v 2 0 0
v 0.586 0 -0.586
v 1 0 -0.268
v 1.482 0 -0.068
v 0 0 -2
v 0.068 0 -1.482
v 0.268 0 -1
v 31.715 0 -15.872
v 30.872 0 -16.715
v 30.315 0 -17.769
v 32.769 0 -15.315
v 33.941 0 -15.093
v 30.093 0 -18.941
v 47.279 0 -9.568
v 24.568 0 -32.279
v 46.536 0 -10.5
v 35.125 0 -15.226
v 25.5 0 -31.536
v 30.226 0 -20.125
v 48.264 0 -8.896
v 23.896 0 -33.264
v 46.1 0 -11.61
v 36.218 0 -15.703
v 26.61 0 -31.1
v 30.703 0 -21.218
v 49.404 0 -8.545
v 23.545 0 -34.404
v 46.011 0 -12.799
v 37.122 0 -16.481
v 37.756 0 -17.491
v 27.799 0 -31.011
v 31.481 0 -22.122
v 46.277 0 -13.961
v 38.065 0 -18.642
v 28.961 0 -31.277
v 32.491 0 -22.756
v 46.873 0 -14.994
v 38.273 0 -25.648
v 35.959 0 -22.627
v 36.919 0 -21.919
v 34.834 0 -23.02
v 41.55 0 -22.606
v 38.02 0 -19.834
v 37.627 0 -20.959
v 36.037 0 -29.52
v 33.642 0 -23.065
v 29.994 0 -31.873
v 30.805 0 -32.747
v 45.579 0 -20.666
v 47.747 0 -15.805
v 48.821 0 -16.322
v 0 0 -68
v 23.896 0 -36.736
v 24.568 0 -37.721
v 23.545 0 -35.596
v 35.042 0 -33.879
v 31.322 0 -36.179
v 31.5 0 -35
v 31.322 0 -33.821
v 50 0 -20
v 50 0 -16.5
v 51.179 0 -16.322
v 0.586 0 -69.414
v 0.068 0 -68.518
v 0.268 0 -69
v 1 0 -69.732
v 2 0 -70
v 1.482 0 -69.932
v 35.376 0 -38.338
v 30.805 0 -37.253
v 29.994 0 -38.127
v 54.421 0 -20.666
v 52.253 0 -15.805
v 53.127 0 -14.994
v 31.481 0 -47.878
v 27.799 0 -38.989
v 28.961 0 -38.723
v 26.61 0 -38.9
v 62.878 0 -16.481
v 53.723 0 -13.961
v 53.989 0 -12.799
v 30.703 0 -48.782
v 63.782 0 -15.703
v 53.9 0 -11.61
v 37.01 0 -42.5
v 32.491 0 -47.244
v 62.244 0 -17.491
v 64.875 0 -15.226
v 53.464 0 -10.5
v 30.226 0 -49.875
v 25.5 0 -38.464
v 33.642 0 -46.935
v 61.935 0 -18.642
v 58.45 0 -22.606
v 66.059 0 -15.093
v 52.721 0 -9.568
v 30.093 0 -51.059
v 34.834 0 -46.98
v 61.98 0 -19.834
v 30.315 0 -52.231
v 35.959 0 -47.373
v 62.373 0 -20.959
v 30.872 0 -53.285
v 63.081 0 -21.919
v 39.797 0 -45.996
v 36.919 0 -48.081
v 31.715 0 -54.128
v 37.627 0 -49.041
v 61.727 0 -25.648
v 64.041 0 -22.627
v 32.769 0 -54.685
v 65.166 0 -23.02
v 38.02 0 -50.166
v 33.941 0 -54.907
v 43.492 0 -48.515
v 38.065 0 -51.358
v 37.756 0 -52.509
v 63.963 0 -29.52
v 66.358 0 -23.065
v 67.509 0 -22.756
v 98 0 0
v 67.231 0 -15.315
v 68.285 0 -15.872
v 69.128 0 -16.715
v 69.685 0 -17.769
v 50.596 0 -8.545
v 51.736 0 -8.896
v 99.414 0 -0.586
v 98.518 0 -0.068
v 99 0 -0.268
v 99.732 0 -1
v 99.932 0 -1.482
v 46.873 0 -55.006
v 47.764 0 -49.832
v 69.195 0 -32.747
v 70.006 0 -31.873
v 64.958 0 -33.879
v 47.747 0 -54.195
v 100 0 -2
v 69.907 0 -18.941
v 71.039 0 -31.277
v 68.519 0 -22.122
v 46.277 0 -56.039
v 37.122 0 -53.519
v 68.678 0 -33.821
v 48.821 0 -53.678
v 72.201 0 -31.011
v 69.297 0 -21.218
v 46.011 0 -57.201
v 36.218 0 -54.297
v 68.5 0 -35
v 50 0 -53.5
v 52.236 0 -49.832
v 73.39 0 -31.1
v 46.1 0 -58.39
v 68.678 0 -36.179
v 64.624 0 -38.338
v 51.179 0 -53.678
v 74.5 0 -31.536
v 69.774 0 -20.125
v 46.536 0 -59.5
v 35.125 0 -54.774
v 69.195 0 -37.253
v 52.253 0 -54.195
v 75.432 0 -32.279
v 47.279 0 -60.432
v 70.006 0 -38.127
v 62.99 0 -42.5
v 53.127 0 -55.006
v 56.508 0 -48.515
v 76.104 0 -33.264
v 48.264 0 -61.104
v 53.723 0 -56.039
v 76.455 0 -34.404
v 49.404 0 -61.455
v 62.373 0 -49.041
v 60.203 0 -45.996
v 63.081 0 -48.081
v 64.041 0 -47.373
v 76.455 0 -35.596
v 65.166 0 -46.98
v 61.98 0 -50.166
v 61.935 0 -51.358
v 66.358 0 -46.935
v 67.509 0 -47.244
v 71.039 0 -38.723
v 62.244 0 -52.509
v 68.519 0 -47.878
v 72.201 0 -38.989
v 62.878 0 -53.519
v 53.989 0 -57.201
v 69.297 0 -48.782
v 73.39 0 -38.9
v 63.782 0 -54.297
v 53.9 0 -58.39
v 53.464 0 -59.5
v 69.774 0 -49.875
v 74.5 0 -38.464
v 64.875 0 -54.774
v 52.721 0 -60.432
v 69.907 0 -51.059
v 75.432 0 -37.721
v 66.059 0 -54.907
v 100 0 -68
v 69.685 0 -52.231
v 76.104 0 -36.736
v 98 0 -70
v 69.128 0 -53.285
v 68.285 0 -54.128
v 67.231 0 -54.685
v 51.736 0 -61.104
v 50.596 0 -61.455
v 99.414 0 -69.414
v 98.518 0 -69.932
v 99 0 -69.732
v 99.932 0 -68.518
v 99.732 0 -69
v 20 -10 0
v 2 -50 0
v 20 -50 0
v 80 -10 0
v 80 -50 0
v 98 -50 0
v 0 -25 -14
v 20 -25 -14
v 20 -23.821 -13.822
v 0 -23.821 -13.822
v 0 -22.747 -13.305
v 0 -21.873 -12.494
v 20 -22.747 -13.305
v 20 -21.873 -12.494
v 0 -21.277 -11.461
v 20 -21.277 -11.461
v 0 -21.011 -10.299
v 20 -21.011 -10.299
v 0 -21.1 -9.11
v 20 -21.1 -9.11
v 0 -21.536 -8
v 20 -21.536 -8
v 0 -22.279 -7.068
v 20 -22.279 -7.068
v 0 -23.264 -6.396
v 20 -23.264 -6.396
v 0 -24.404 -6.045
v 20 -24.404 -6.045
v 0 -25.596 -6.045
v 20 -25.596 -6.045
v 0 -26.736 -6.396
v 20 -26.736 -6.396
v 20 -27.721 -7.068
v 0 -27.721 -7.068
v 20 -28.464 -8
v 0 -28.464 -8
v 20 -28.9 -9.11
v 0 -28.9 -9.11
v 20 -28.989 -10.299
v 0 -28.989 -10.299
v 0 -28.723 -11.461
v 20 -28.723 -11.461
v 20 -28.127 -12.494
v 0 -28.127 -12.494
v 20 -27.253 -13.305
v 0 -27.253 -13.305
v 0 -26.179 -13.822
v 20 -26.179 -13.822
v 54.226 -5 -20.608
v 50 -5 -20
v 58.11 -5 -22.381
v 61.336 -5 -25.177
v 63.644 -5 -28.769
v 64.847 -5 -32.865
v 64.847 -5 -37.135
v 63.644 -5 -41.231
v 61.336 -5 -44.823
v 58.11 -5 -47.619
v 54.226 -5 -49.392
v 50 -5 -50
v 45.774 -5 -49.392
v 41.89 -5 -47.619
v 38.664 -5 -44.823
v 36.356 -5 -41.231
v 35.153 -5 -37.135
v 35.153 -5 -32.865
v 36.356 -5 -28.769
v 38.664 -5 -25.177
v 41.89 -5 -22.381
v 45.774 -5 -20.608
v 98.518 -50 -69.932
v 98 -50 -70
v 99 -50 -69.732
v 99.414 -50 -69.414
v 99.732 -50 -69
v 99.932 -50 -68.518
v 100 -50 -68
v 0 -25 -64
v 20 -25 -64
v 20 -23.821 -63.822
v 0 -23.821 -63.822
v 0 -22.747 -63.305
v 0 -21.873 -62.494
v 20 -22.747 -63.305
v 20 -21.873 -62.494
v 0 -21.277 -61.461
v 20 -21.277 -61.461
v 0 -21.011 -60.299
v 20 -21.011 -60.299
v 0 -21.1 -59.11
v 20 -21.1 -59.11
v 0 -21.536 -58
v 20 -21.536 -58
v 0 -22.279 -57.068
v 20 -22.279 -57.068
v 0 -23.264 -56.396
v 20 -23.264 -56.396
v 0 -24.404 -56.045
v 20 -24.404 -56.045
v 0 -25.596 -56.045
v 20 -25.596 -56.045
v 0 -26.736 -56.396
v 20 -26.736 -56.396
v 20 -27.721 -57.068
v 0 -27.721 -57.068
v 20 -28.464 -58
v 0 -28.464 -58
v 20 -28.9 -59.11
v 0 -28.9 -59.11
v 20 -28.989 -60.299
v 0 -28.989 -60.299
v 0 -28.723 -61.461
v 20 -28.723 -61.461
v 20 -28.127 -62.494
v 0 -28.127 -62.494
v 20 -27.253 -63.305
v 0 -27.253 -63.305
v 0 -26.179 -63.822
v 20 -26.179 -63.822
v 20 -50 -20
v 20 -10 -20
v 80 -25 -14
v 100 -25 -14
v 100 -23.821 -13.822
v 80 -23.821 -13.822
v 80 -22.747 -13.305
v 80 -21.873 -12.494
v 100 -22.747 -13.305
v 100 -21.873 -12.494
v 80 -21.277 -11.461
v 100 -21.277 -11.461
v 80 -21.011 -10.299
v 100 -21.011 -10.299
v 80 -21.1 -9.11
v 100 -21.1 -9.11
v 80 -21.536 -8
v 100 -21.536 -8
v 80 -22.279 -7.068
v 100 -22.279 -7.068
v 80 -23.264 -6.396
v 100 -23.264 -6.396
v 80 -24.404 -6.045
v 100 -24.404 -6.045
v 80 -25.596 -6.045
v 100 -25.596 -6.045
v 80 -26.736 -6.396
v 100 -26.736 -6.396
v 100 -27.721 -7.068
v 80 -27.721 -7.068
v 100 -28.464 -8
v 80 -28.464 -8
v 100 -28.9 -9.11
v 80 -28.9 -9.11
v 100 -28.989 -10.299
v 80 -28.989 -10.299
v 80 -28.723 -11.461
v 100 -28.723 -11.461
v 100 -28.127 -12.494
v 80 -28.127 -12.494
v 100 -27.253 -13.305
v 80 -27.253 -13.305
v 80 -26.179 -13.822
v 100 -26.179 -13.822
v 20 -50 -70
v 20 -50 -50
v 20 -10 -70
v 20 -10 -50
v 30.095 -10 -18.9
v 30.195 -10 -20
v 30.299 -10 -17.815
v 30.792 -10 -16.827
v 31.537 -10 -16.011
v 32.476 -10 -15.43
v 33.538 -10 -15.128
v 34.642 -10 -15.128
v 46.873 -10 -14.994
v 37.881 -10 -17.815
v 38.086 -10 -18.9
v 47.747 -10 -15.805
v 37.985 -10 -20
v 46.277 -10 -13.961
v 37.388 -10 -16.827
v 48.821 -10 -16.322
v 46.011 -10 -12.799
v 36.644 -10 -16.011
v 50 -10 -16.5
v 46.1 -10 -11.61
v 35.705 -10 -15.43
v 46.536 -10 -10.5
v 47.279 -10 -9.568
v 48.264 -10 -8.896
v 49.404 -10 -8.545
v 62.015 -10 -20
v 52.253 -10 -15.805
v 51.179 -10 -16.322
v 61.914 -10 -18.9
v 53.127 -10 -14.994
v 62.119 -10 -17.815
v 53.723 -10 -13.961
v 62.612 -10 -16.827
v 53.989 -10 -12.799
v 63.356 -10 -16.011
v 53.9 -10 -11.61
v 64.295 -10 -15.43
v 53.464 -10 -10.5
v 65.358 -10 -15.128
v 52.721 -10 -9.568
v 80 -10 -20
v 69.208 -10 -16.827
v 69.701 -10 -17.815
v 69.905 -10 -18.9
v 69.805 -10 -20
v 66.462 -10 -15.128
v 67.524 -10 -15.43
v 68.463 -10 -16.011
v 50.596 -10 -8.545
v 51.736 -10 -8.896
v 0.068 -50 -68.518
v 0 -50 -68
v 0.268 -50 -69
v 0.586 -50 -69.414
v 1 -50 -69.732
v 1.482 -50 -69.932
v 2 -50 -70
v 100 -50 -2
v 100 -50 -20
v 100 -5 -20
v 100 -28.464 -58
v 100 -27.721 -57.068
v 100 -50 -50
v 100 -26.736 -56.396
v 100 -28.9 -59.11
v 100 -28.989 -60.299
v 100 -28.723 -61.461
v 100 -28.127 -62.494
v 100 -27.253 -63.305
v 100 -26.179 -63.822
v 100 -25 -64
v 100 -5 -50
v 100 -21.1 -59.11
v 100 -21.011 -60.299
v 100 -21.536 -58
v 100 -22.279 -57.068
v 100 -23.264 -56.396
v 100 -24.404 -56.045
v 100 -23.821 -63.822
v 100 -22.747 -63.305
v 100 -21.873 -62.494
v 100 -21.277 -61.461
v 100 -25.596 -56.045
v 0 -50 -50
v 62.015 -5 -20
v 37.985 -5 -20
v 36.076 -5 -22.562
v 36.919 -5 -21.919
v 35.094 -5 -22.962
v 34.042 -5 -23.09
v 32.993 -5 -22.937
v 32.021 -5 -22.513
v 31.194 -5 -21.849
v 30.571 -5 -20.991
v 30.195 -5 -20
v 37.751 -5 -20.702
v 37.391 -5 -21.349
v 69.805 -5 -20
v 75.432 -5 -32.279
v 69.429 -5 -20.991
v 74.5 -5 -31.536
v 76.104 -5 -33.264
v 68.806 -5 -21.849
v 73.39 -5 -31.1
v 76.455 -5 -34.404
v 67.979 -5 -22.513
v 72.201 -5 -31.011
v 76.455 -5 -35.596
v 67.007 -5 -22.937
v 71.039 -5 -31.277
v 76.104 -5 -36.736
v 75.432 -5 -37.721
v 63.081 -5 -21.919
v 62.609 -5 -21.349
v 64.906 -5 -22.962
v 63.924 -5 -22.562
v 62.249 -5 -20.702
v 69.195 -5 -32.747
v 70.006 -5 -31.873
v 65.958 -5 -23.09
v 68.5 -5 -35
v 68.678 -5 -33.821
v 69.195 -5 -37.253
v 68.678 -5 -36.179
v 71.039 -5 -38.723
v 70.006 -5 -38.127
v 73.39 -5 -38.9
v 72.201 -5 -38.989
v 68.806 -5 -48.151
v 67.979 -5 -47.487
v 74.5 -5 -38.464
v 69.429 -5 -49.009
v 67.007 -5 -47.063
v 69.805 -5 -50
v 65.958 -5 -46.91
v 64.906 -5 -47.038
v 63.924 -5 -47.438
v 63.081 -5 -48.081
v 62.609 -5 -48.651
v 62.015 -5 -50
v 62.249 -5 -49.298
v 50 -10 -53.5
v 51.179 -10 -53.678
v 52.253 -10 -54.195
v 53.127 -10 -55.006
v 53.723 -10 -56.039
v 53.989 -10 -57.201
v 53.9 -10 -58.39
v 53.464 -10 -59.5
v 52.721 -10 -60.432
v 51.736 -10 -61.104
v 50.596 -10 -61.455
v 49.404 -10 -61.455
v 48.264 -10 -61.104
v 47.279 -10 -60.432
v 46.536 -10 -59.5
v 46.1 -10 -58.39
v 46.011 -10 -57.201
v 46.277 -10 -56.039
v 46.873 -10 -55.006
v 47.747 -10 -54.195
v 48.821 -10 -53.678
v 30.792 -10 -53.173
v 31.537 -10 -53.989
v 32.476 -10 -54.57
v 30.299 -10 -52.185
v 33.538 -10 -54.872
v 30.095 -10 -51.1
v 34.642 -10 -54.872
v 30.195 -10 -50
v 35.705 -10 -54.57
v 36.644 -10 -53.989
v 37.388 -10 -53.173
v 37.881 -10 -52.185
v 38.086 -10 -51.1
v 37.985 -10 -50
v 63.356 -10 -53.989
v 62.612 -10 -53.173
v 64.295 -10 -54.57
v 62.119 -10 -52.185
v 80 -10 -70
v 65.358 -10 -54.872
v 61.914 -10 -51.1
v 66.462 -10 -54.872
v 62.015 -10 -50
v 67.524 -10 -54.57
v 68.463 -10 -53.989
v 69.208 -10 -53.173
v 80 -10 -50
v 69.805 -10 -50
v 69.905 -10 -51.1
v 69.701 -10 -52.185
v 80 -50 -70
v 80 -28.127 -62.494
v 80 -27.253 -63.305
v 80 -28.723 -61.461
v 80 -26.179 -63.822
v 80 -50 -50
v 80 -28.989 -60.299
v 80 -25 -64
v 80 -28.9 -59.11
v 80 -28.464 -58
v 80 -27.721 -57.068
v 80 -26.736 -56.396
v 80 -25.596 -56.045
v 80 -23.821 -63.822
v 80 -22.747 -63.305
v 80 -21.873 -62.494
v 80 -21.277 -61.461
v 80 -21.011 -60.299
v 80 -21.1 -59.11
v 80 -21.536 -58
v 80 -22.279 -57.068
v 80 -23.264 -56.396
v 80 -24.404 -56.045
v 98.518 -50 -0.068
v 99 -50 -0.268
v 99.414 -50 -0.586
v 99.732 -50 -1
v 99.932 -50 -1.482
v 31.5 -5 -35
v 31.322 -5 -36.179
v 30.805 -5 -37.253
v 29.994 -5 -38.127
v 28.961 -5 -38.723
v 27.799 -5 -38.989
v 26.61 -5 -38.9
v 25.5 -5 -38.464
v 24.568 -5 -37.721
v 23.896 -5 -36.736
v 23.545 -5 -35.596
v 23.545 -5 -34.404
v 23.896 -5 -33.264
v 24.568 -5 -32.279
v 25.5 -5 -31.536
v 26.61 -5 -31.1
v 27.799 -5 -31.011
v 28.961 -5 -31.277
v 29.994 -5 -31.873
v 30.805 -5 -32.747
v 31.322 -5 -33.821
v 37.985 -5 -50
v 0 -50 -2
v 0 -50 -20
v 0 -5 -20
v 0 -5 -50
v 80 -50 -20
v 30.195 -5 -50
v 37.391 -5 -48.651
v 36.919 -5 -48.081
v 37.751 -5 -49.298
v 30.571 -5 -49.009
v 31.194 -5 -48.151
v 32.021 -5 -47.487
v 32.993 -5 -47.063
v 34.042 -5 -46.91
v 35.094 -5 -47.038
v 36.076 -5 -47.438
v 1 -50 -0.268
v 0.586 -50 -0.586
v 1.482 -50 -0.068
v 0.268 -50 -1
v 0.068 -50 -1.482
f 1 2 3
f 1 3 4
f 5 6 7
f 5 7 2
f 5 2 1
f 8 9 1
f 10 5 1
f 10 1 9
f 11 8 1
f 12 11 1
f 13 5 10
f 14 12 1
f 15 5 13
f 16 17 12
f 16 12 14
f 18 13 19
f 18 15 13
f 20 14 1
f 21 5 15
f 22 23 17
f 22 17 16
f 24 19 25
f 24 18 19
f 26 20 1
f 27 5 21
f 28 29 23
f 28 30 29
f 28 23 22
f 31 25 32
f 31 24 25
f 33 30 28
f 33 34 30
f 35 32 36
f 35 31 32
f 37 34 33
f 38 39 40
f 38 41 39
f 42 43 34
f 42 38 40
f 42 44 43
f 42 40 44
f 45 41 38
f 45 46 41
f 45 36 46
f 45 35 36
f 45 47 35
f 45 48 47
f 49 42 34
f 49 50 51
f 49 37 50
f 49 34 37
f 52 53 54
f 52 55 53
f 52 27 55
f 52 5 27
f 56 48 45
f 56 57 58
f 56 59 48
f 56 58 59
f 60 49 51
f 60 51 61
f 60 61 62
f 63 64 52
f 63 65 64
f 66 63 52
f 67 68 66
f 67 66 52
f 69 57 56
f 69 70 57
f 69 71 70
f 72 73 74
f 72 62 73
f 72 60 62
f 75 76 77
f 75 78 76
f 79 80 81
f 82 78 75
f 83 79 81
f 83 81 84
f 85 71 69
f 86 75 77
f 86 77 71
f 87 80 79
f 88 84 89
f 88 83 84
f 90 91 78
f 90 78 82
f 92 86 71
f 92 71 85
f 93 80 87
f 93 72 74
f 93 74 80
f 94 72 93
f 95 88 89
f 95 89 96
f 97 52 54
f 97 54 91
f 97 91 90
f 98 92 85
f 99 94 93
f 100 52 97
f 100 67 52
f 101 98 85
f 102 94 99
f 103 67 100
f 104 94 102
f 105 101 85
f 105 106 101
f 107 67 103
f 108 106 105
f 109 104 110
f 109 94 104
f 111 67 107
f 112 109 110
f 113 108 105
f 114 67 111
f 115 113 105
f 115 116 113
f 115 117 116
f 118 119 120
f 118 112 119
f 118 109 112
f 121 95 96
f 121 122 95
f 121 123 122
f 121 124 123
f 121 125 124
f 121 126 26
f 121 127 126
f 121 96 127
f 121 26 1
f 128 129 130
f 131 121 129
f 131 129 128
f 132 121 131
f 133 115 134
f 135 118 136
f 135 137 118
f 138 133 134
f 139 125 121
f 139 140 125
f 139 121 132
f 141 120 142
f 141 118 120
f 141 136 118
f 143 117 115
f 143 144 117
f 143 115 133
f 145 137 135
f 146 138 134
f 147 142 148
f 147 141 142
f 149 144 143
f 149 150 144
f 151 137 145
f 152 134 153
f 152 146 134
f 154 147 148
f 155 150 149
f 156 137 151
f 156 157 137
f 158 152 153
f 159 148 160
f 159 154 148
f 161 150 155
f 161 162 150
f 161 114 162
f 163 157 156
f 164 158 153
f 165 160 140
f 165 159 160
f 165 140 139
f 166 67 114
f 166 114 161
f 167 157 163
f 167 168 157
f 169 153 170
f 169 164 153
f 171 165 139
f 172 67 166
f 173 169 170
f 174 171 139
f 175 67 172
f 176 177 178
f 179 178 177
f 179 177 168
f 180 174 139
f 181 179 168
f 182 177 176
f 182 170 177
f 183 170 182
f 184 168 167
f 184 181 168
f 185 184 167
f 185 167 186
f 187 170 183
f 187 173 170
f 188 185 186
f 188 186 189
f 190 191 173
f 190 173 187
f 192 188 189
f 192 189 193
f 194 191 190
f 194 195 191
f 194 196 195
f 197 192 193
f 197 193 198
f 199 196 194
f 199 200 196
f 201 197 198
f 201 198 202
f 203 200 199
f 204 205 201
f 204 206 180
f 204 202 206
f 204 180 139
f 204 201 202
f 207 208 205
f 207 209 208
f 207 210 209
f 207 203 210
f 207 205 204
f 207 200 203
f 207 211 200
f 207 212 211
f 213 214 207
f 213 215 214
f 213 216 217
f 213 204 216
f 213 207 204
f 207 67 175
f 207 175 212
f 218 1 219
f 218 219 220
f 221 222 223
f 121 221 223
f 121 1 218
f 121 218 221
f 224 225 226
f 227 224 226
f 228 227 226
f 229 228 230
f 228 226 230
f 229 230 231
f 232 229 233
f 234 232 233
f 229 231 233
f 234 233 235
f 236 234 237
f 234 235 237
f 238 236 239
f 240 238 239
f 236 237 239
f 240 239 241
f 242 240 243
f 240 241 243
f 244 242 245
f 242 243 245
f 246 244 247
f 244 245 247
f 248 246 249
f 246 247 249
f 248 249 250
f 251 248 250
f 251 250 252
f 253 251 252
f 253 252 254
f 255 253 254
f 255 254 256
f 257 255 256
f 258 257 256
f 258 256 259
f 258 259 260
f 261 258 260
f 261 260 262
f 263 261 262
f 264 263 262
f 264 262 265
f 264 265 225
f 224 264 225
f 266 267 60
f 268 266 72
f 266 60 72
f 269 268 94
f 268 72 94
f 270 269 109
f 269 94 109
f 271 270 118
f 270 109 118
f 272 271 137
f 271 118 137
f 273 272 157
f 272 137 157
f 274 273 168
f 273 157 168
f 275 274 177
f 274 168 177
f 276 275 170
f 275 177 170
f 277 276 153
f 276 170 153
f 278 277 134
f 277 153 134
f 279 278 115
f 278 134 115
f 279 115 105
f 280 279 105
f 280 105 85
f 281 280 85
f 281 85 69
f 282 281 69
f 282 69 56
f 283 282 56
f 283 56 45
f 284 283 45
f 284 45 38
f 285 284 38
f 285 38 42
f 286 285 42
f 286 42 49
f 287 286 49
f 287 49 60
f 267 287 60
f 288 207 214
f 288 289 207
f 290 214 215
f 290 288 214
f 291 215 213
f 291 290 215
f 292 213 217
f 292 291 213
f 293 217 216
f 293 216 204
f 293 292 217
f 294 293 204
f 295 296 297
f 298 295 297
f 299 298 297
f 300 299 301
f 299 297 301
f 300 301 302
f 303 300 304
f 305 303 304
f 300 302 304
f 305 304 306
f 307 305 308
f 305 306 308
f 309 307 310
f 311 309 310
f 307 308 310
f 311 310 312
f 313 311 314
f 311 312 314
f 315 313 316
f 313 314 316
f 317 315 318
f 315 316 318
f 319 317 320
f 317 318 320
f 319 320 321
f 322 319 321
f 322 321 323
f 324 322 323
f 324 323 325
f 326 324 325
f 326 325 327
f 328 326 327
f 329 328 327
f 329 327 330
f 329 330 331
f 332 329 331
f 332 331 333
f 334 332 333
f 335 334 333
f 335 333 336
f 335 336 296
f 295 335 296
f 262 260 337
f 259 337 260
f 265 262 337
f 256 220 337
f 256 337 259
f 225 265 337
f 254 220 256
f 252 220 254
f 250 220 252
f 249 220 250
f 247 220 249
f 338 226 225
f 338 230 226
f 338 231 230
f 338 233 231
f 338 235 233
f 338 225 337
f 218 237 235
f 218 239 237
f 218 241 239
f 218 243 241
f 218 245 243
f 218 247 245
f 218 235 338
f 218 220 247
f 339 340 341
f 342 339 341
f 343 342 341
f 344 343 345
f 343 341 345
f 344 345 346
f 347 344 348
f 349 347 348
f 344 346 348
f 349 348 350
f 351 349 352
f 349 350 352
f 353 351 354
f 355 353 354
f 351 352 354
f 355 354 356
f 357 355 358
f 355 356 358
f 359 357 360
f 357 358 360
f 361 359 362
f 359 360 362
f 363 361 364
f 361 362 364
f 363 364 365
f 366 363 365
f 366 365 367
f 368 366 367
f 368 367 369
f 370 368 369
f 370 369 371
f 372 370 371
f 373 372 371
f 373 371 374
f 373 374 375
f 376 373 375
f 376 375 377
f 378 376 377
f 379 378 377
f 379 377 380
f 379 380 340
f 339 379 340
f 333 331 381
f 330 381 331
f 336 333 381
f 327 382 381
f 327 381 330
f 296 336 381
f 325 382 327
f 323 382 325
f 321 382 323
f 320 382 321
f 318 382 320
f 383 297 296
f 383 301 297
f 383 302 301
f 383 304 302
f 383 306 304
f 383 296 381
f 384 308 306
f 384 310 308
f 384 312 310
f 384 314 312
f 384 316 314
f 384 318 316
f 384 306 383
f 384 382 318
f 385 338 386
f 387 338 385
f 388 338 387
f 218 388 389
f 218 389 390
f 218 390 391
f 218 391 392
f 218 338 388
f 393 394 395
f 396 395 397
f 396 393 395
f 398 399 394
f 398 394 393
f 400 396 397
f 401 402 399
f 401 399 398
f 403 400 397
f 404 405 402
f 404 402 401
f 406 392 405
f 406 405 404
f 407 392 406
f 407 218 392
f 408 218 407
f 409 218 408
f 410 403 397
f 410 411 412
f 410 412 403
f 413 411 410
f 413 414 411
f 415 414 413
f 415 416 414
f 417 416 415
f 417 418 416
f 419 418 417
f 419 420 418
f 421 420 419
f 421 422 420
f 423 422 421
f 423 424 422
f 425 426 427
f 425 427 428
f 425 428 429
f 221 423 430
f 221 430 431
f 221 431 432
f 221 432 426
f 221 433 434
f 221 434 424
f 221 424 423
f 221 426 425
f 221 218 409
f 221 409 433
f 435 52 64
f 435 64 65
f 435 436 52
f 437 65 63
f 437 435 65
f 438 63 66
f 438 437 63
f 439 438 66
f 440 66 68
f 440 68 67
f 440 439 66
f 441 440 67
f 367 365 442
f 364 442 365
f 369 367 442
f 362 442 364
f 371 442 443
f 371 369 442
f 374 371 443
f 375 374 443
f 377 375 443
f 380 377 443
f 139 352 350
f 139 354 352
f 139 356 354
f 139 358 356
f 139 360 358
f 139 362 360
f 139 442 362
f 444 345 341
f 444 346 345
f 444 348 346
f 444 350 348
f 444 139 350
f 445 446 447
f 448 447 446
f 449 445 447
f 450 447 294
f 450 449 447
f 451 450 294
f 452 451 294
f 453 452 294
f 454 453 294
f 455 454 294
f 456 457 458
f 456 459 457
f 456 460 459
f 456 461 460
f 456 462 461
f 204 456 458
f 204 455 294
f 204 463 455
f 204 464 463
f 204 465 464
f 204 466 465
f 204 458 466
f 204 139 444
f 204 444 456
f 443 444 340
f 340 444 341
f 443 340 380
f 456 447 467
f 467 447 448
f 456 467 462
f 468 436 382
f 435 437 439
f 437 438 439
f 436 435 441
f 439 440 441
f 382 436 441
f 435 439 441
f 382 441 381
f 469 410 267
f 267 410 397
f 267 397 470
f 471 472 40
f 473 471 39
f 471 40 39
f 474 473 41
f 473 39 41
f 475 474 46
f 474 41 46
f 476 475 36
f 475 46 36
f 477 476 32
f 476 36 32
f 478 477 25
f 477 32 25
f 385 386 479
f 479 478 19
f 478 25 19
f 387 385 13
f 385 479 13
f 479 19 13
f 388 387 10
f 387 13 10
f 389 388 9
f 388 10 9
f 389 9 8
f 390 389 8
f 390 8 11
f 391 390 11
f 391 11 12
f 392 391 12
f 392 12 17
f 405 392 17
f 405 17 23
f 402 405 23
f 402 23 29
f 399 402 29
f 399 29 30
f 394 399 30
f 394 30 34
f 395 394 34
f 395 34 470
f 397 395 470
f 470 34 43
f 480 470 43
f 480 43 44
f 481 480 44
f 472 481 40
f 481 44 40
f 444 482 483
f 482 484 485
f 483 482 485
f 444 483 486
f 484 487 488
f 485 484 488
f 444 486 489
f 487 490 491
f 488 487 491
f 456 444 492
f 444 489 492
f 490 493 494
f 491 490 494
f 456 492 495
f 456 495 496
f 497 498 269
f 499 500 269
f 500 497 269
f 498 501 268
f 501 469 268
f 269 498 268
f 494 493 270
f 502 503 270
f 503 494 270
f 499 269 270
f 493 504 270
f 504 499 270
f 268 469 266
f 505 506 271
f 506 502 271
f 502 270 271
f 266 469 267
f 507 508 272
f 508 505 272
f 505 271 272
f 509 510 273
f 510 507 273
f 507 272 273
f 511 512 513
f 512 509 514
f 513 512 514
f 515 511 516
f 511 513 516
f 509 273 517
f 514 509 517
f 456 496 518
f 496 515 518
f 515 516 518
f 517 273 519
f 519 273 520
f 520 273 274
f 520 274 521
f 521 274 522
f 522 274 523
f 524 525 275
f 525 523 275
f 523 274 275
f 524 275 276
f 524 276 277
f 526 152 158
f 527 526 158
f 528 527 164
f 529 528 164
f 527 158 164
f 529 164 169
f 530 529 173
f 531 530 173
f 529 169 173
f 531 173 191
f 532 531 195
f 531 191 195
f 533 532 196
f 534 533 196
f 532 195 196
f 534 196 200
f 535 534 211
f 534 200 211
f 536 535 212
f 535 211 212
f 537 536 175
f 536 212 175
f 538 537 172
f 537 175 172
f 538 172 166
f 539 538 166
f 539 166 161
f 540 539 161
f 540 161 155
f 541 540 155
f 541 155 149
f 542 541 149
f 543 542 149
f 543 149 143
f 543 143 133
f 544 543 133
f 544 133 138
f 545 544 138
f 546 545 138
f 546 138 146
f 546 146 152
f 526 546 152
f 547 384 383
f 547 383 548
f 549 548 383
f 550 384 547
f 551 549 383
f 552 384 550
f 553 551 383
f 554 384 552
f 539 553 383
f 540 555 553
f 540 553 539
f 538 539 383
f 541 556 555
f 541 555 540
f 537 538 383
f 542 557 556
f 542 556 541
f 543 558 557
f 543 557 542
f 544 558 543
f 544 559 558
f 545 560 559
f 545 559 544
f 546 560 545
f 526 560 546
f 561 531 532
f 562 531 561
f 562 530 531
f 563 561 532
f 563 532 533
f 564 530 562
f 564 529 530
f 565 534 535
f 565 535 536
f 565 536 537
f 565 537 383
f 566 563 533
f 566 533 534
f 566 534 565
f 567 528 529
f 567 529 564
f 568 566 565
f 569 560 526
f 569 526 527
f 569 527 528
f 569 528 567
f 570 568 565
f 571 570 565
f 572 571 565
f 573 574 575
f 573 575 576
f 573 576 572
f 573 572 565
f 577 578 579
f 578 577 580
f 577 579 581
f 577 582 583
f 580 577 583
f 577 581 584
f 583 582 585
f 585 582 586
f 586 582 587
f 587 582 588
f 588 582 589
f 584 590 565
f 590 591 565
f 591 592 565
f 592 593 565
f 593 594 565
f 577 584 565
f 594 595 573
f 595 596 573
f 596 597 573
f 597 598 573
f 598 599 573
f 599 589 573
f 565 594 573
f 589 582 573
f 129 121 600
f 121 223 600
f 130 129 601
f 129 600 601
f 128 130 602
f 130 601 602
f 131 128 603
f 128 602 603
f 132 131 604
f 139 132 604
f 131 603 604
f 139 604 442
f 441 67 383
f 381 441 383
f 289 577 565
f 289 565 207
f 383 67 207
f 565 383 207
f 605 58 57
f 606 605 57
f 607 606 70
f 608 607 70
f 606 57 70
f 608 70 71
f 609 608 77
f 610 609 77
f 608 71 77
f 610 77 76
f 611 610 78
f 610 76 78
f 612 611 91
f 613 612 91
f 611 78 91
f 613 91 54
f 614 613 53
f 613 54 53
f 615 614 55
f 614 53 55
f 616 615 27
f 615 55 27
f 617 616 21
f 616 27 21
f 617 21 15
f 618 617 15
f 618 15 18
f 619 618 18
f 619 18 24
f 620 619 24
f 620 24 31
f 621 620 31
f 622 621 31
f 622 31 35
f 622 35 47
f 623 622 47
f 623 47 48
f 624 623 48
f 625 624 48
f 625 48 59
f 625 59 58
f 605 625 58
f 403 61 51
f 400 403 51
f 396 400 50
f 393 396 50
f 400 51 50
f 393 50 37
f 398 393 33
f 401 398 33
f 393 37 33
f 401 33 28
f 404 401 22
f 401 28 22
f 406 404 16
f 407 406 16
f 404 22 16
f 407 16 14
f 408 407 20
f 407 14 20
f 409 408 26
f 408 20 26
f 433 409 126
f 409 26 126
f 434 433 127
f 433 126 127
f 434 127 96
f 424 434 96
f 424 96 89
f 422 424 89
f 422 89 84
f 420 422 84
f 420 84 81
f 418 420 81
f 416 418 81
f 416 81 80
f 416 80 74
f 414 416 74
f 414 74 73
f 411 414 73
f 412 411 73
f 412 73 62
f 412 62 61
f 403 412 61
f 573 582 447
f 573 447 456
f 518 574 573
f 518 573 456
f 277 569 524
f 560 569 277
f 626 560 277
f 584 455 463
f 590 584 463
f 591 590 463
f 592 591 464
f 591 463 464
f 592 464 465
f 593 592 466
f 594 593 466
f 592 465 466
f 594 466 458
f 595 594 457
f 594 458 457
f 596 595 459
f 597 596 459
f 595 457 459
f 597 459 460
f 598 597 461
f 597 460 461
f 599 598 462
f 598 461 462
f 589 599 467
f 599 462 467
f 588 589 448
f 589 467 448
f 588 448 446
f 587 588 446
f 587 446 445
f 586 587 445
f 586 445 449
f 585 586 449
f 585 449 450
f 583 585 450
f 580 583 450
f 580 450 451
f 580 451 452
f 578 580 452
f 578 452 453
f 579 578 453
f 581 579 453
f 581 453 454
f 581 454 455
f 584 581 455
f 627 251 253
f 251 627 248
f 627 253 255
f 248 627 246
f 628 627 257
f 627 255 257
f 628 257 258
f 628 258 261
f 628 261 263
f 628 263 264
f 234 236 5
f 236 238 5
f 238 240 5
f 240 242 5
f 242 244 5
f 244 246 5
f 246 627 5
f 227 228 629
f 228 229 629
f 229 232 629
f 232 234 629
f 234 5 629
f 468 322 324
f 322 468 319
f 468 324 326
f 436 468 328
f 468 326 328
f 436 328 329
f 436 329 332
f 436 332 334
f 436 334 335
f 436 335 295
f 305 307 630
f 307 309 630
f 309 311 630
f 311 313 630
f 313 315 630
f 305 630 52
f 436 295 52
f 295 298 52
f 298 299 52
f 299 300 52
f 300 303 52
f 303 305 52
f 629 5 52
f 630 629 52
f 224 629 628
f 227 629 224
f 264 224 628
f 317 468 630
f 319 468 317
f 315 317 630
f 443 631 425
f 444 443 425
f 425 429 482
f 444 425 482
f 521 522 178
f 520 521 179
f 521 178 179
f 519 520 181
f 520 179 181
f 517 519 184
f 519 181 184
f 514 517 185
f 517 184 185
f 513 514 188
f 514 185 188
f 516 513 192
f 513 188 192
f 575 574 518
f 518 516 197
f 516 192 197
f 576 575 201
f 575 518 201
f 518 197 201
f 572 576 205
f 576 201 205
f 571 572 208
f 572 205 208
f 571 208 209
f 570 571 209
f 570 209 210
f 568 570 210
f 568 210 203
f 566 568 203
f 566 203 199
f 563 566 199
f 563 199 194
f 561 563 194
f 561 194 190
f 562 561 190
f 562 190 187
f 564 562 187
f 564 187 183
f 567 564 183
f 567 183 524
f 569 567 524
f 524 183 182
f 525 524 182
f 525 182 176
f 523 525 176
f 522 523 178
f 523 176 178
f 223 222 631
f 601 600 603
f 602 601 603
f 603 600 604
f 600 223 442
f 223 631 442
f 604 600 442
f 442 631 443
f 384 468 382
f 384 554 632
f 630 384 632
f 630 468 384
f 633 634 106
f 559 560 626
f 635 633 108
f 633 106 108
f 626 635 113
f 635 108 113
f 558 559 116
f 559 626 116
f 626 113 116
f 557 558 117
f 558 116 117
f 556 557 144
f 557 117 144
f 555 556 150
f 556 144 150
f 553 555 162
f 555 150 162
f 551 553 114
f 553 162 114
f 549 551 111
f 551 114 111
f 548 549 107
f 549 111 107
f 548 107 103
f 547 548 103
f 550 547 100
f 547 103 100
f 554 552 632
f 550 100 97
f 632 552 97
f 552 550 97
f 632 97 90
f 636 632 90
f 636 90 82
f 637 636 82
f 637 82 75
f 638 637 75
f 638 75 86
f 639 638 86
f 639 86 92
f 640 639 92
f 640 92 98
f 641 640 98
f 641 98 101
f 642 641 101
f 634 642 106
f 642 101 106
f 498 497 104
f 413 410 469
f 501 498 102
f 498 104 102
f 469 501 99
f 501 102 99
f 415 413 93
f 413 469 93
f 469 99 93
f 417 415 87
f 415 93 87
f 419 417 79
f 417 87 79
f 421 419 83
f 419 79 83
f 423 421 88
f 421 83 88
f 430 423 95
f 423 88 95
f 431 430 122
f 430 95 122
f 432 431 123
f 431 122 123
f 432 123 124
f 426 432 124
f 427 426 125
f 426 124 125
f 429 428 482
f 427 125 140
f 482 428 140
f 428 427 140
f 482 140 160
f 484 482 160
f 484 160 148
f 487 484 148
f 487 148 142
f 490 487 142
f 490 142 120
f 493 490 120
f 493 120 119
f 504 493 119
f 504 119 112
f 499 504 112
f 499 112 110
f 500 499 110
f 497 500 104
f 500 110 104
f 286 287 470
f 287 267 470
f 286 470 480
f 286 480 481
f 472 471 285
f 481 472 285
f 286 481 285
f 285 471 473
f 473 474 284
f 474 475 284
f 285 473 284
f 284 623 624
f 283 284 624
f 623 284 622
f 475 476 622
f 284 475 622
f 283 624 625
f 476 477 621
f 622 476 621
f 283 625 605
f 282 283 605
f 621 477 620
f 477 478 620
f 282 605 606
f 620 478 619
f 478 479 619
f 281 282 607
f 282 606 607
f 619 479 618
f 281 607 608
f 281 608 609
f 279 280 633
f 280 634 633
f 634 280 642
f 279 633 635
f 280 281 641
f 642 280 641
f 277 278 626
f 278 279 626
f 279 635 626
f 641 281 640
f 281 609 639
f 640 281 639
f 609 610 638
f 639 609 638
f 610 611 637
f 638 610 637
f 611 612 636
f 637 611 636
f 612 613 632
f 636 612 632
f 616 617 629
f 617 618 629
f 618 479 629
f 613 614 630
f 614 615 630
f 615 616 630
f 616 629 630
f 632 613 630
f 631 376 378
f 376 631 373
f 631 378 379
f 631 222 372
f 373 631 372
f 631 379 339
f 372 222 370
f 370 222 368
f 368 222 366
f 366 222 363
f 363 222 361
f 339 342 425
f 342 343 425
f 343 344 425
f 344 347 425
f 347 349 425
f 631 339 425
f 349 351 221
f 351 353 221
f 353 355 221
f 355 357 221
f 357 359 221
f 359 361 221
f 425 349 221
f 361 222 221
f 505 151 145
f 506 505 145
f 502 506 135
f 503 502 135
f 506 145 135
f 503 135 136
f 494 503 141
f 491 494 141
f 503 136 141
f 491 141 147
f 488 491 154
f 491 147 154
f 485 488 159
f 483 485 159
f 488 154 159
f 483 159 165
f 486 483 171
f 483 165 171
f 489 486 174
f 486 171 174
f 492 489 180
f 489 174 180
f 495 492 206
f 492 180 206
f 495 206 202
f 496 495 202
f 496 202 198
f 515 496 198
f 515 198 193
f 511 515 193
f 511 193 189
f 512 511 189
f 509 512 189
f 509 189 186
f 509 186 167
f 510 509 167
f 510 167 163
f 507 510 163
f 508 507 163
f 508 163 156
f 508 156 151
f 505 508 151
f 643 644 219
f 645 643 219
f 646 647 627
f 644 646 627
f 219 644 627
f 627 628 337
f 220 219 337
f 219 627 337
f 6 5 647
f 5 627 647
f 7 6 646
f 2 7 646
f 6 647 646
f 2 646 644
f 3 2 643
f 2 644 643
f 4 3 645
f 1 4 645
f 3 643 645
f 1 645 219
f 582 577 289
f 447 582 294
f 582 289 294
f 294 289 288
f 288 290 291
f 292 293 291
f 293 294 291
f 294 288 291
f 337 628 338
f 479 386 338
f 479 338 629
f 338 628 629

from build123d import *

# Parameters (mm, degrees)
ESBO_O1_W                = 100
ESBO_O1_H                = 70
RESSALTO_EXTRUS_O1_DEPTH = 50
ESBO_O2_W                = 30
ESBO_O2_H                = 90
CORTE_EXTRUS_O1_DEPTH    = 239
ESBO_O3_R                = 4
CORTE_EXTRUS_O2_DEPTH    = 100
CORTE_EXTRUS_O3_REACH    = 133.909
ESBO_O4_W                = 60
ESBO_O4_H                = 80
FILETE2_R                = 2
FILETE3_R                = 2
ESBO_O5_R                = 15
CORTE_EXTRUS_O4_DEPTH    = 5
ESBO_O6_R                = 4
CORTE_EXTRUS_O7_DEPTH    = 239
PADR_OCIRCULAR1_COUNT    = 8


with BuildPart() as part:
    # Esboço1 → Ressalto-extrusão1 (new body)
    with BuildSketch(Plane(origin=(0, 0, 0), x_dir=(1, 0, 0), z_dir=(0, 1, 0))):
        with Locations((50, 35)):
            Rectangle(ESBO_O1_W, ESBO_O1_H)
    extrude(amount=-RESSALTO_EXTRUS_O1_DEPTH)

    # Esboço2 → Corte-extrusão1 (cut)
    with BuildSketch(Plane(origin=(0, 0, 0), x_dir=(0, 0, -1), z_dir=(1, 0, 0))):
        with Locations((35, -50)):
            Rectangle(ESBO_O2_W, ESBO_O2_H)
    extrude(amount=CORTE_EXTRUS_O1_DEPTH, mode=Mode.SUBTRACT)

    # Esboço3 → Corte-extrusão2 (cut)
    with BuildSketch(Plane(origin=(100, 0, 0), x_dir=(0, 0, -1), z_dir=(1, 0, 0))):
        with Locations((10, -25)):
            Circle(ESBO_O3_R)
        with Locations((60, -25)):
            Circle(ESBO_O3_R)
    extrude(amount=-CORTE_EXTRUS_O2_DEPTH, mode=Mode.SUBTRACT)

    # Corte-extrusão3: up to this face of the body (flat: up to its plane)
    corte_extrus_o3_end = Plane(part.part.faces().sort_by_distance((50, -25, -70))[0])
    # Esboço4 → Corte-extrusão3 (cut, up to the picked face)
    with BuildSketch(Plane.XY, mode=Mode.PRIVATE) as corte_extrus_o3_sk1:
        with Locations((50, -50)):
            Rectangle(ESBO_O4_W, ESBO_O4_H)
    corte_extrus_o3_tool1 = split(extrude(corte_extrus_o3_sk1.sketch, amount=-CORTE_EXTRUS_O3_REACH, mode=Mode.PRIVATE), bisect_by=corte_extrus_o3_end, keep=Keep.BOTH, mode=Mode.PRIVATE)
    add(corte_extrus_o3_tool1.solids().sort_by(Axis((50, -50, 0), (0, 0, -1)))[0], mode=Mode.SUBTRACT)

    # Filete2
    filete2_edges = [part.edges().sort_by_distance(p)[0] for p in [
        (0, -25, -70),
    ]]
    fillet(filete2_edges, radius=FILETE2_R)

    # Filete3
    filete3_edges = [part.edges().sort_by_distance(p)[0] for p in [
        (100, -25, -70),
        (100, -25, 0),
        (0, -25, 0),
    ]]
    fillet(filete3_edges, radius=FILETE3_R)

    # Esboço5 → Corte-extrusão4 (cut)
    with BuildSketch(Plane(origin=(0, 0, 0), x_dir=(1, 0, 0), z_dir=(0, 1, 0))):
        with Locations(Location((50, 35, 0), (0, 0, 270))):
            Circle(ESBO_O5_R)
    extrude(amount=-CORTE_EXTRUS_O4_DEPTH, mode=Mode.SUBTRACT)

    # Esboço6 → Corte-extrusão7 (cut)
    with BuildSketch(Plane(origin=(0, 0, 0), x_dir=(1, 0, 0), z_dir=(0, 1, 0))):
        with Locations(Location((50, 57.5, 0), (0, 0, 270))):
            Circle(ESBO_O6_R)
    corte_extrus_o7 = extrude(amount=-CORTE_EXTRUS_O7_DEPTH, mode=Mode.SUBTRACT)

    # PadrãoCircular1: Corte-extrusão7 ×8 about axis
    padr_ocircular1_axis = Axis((50, 0, -35), (0, 1, 0))
    for i in range(1, PADR_OCIRCULAR1_COUNT):
        add(corte_extrus_o7.rotate(padr_ocircular1_axis, i * 360 / PADR_OCIRCULAR1_COUNT), mode=Mode.SUBTRACT)


solid = part.part
